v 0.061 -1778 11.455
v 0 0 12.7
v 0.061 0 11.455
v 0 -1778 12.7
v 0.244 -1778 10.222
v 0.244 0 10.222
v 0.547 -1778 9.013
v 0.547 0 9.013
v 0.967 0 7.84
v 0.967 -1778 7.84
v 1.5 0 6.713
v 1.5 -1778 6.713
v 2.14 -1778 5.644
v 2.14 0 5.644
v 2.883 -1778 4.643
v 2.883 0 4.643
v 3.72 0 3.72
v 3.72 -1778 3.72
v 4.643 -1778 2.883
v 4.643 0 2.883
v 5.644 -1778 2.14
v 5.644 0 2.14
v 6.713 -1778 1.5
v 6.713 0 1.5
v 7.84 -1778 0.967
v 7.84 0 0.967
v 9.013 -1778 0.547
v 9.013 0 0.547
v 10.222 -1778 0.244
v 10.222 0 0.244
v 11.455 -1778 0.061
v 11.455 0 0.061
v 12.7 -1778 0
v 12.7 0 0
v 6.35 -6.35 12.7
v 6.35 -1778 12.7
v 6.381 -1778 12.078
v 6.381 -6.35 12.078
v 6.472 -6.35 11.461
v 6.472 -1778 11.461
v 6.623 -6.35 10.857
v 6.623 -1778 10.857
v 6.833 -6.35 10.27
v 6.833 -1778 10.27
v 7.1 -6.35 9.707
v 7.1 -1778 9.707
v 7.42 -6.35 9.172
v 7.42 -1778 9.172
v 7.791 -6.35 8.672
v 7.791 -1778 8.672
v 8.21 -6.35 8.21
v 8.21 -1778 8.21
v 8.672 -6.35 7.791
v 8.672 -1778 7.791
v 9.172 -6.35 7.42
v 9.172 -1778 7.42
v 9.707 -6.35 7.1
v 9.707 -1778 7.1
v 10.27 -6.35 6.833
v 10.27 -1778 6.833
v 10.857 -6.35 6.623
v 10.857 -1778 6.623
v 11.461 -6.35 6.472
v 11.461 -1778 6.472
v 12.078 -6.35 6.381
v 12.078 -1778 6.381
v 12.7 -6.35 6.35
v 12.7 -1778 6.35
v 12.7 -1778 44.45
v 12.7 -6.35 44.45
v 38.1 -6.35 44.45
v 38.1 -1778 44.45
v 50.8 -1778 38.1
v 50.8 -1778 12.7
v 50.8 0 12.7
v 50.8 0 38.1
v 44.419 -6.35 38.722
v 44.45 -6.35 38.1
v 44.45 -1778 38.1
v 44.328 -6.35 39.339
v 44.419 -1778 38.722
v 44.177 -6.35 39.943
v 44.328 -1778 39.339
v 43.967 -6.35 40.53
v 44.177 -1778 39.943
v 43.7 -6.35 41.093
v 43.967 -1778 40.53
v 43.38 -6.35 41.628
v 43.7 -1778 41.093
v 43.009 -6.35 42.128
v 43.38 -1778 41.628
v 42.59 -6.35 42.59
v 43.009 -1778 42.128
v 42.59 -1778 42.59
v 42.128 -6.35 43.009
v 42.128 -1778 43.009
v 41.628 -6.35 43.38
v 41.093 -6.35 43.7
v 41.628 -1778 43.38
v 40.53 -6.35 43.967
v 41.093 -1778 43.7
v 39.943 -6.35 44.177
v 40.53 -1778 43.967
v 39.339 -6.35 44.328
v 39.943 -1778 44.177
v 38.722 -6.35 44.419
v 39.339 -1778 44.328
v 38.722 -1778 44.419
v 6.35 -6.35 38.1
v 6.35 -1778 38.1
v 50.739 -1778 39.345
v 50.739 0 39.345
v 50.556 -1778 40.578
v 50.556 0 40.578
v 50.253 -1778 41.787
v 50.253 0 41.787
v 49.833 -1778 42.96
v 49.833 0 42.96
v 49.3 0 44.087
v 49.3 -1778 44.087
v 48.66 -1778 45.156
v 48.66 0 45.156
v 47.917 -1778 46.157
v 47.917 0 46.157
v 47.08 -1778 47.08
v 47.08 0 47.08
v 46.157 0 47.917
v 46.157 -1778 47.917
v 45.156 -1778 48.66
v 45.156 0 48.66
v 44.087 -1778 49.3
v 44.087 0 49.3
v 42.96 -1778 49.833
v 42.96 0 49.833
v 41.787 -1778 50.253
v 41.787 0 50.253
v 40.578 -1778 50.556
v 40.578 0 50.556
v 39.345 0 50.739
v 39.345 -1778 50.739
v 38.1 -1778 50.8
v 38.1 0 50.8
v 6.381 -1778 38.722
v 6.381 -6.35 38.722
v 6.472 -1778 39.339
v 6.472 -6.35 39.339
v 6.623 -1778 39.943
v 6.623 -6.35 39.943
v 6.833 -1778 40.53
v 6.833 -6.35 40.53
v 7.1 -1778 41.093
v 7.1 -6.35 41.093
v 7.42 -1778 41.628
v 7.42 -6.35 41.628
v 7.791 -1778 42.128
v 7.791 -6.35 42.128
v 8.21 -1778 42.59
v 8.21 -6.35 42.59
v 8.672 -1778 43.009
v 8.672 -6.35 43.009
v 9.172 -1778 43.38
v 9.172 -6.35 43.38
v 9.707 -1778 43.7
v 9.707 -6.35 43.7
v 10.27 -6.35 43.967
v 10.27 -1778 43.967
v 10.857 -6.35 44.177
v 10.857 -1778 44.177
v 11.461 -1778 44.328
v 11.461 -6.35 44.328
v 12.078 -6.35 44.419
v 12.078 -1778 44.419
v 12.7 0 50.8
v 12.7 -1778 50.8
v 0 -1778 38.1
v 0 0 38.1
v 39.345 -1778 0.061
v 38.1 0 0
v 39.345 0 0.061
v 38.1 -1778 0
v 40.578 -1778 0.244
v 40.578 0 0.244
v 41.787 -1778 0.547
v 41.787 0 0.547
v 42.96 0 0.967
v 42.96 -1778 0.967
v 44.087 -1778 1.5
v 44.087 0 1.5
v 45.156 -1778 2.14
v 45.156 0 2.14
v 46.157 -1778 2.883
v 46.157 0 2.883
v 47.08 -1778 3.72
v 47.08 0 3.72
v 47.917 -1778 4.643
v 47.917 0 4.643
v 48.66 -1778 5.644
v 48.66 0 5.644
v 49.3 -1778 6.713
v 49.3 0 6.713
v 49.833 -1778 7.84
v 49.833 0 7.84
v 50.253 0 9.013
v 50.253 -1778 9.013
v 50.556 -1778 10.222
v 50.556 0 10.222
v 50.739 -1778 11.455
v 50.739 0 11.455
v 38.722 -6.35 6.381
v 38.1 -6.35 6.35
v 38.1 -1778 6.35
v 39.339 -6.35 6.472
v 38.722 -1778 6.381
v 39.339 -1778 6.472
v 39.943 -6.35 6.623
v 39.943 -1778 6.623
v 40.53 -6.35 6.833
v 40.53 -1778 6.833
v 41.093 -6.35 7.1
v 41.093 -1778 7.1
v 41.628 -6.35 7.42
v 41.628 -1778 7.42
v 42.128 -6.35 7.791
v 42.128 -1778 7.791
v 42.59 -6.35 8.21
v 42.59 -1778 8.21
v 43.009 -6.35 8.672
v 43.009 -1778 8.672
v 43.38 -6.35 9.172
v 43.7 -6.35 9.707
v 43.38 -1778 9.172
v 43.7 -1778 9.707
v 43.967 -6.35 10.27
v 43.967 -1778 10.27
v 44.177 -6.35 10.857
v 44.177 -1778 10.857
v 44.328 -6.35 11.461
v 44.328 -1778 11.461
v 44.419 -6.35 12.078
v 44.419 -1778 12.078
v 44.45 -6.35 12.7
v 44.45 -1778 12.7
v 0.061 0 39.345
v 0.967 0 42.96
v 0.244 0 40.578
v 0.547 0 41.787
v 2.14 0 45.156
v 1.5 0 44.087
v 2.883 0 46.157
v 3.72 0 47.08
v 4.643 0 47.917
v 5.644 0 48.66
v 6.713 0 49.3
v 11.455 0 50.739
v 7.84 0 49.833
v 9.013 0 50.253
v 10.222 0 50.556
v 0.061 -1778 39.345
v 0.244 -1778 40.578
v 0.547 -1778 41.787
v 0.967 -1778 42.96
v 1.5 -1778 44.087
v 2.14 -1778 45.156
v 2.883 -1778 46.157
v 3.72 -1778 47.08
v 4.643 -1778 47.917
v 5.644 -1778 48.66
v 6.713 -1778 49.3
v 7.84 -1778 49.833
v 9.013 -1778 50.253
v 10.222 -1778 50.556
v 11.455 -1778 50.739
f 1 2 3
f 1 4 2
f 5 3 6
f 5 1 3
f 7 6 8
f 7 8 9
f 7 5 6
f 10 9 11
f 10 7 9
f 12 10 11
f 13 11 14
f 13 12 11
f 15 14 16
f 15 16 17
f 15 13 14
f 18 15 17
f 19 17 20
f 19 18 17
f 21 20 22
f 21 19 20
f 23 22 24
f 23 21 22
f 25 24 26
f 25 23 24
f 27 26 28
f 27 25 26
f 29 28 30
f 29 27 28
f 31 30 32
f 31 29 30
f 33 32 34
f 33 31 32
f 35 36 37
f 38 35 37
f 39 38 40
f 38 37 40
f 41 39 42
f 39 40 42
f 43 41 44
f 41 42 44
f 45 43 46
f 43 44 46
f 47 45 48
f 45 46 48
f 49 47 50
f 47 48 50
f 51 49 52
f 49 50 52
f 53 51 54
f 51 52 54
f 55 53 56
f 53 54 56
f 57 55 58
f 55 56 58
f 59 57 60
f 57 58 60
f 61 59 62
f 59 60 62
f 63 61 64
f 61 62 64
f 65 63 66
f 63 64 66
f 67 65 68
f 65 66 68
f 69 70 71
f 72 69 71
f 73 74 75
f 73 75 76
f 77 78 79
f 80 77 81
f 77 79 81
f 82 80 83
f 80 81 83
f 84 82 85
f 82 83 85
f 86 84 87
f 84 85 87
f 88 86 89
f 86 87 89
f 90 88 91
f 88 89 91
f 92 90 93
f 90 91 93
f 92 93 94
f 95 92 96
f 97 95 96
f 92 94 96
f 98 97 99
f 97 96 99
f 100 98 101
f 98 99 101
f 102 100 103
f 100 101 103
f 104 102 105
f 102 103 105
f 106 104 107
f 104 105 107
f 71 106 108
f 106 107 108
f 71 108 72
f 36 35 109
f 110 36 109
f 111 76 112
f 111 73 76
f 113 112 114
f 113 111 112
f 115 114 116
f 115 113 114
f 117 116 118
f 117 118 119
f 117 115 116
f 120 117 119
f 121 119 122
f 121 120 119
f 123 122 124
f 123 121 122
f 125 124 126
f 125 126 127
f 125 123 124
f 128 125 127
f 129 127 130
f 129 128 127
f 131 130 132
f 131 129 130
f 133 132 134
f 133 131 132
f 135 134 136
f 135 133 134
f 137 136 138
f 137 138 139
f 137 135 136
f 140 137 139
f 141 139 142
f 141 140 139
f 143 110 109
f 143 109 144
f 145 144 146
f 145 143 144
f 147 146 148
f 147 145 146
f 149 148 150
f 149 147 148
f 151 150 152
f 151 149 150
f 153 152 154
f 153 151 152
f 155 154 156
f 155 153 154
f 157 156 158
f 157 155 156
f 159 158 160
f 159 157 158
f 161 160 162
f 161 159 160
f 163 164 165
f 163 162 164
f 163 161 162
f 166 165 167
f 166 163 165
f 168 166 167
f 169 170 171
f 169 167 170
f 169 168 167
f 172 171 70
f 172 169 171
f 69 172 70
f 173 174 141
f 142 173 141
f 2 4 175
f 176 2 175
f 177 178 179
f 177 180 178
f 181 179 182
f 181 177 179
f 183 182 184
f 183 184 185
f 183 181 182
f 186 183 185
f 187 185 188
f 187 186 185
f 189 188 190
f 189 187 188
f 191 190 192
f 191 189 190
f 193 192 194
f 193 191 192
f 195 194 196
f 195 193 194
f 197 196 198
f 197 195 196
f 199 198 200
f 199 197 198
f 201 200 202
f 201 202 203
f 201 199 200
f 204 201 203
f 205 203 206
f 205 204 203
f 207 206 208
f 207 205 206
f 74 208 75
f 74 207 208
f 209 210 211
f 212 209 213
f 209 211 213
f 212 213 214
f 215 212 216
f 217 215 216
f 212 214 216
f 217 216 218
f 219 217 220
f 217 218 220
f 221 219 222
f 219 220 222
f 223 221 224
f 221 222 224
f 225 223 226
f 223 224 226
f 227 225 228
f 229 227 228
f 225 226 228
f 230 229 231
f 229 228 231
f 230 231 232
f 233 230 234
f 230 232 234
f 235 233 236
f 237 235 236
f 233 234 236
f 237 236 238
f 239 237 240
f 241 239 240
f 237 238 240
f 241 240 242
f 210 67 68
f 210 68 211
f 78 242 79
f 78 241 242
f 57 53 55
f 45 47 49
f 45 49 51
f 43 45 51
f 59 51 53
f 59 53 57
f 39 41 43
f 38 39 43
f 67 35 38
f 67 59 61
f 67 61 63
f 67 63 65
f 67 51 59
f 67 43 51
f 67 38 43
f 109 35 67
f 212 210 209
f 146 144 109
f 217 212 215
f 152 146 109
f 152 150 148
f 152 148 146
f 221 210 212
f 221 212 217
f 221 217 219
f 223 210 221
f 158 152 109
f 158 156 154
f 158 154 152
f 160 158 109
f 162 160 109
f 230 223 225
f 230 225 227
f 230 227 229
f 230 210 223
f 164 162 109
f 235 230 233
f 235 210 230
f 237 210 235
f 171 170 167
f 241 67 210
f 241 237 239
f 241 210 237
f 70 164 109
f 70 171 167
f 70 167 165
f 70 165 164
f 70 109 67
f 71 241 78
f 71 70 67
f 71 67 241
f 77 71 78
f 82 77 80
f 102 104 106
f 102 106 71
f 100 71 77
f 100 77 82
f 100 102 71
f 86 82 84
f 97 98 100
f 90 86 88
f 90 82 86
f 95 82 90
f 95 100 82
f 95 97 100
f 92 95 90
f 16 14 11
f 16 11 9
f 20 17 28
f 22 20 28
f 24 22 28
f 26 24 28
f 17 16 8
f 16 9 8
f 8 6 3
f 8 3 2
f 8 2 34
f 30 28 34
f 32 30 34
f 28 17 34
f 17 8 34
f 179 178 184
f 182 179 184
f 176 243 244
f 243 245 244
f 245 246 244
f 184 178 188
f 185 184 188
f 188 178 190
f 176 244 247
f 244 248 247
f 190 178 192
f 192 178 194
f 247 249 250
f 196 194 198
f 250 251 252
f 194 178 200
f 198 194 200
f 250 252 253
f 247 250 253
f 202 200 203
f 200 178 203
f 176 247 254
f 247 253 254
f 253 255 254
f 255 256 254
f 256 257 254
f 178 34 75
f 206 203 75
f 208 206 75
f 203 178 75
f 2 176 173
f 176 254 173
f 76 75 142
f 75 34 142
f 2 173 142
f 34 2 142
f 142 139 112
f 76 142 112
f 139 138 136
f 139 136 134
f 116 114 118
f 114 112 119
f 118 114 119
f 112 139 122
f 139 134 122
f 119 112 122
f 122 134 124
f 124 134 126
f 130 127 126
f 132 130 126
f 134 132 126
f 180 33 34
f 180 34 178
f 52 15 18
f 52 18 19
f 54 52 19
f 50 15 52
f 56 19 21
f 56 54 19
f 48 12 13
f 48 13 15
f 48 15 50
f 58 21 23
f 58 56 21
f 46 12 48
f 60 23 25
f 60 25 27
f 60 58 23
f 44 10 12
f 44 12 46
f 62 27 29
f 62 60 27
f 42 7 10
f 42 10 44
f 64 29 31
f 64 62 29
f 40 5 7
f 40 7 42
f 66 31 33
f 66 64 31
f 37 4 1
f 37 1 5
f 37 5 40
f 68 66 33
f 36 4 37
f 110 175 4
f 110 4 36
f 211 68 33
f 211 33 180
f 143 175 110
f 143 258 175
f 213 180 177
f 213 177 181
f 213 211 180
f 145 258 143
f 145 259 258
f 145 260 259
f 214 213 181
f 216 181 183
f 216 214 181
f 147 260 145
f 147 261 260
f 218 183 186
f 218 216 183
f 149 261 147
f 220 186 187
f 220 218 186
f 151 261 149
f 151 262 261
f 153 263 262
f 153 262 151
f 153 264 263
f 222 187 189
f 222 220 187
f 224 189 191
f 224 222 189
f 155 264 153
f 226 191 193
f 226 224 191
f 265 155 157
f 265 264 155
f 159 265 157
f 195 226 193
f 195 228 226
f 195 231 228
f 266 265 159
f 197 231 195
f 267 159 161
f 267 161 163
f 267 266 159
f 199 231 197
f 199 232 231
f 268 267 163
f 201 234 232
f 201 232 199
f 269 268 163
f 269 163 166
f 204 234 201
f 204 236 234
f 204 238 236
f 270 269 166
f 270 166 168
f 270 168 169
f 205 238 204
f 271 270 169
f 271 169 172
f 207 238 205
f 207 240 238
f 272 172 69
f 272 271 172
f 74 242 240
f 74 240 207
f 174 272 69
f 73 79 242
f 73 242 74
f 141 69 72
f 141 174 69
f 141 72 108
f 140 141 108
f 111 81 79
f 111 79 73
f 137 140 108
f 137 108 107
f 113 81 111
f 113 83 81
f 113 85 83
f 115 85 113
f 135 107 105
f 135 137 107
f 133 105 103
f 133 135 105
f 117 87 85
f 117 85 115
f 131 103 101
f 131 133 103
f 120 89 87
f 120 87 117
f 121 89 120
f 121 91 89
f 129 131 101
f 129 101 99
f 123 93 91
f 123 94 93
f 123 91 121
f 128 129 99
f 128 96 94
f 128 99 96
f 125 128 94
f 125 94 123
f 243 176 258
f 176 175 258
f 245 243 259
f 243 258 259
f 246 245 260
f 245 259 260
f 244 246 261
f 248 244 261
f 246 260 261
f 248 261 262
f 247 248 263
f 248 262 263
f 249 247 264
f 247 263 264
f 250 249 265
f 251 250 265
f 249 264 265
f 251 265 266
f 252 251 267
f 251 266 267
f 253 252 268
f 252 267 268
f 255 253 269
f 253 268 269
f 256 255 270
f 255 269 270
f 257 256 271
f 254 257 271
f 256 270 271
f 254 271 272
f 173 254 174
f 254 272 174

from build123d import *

# Parameters (mm, degrees)
F1_W     = 50.8
F1_H     = 50.8
F2_DEPTH = 1778
F3_R     = 12.7
F4_T     = -6.35


with BuildPart() as f2:
    # F1 (on face) → F2 (new body)
    with BuildSketch(Plane.XZ):
        with Locations((25.4, 25.4)):
            Rectangle(F1_W, F1_H)
    extrude(amount=F2_DEPTH)

    # F3
    f3_edges = [f2.edges().sort_by_distance(p)[0] for p in [
        (0, -889, 50.8),
        (0, -889, 0),
        (50.8, -889, 50.8),
        (50.8, -889, 0),
    ]]
    fillet(f3_edges, radius=F3_R)

    # F4
    f4_openings = [f2.faces().sort_by_distance(p)[0] for p in [
        (25.4, -1778, 25.4),
    ]]
    offset(amount=F4_T, openings=f4_openings)


solid = f2.part
